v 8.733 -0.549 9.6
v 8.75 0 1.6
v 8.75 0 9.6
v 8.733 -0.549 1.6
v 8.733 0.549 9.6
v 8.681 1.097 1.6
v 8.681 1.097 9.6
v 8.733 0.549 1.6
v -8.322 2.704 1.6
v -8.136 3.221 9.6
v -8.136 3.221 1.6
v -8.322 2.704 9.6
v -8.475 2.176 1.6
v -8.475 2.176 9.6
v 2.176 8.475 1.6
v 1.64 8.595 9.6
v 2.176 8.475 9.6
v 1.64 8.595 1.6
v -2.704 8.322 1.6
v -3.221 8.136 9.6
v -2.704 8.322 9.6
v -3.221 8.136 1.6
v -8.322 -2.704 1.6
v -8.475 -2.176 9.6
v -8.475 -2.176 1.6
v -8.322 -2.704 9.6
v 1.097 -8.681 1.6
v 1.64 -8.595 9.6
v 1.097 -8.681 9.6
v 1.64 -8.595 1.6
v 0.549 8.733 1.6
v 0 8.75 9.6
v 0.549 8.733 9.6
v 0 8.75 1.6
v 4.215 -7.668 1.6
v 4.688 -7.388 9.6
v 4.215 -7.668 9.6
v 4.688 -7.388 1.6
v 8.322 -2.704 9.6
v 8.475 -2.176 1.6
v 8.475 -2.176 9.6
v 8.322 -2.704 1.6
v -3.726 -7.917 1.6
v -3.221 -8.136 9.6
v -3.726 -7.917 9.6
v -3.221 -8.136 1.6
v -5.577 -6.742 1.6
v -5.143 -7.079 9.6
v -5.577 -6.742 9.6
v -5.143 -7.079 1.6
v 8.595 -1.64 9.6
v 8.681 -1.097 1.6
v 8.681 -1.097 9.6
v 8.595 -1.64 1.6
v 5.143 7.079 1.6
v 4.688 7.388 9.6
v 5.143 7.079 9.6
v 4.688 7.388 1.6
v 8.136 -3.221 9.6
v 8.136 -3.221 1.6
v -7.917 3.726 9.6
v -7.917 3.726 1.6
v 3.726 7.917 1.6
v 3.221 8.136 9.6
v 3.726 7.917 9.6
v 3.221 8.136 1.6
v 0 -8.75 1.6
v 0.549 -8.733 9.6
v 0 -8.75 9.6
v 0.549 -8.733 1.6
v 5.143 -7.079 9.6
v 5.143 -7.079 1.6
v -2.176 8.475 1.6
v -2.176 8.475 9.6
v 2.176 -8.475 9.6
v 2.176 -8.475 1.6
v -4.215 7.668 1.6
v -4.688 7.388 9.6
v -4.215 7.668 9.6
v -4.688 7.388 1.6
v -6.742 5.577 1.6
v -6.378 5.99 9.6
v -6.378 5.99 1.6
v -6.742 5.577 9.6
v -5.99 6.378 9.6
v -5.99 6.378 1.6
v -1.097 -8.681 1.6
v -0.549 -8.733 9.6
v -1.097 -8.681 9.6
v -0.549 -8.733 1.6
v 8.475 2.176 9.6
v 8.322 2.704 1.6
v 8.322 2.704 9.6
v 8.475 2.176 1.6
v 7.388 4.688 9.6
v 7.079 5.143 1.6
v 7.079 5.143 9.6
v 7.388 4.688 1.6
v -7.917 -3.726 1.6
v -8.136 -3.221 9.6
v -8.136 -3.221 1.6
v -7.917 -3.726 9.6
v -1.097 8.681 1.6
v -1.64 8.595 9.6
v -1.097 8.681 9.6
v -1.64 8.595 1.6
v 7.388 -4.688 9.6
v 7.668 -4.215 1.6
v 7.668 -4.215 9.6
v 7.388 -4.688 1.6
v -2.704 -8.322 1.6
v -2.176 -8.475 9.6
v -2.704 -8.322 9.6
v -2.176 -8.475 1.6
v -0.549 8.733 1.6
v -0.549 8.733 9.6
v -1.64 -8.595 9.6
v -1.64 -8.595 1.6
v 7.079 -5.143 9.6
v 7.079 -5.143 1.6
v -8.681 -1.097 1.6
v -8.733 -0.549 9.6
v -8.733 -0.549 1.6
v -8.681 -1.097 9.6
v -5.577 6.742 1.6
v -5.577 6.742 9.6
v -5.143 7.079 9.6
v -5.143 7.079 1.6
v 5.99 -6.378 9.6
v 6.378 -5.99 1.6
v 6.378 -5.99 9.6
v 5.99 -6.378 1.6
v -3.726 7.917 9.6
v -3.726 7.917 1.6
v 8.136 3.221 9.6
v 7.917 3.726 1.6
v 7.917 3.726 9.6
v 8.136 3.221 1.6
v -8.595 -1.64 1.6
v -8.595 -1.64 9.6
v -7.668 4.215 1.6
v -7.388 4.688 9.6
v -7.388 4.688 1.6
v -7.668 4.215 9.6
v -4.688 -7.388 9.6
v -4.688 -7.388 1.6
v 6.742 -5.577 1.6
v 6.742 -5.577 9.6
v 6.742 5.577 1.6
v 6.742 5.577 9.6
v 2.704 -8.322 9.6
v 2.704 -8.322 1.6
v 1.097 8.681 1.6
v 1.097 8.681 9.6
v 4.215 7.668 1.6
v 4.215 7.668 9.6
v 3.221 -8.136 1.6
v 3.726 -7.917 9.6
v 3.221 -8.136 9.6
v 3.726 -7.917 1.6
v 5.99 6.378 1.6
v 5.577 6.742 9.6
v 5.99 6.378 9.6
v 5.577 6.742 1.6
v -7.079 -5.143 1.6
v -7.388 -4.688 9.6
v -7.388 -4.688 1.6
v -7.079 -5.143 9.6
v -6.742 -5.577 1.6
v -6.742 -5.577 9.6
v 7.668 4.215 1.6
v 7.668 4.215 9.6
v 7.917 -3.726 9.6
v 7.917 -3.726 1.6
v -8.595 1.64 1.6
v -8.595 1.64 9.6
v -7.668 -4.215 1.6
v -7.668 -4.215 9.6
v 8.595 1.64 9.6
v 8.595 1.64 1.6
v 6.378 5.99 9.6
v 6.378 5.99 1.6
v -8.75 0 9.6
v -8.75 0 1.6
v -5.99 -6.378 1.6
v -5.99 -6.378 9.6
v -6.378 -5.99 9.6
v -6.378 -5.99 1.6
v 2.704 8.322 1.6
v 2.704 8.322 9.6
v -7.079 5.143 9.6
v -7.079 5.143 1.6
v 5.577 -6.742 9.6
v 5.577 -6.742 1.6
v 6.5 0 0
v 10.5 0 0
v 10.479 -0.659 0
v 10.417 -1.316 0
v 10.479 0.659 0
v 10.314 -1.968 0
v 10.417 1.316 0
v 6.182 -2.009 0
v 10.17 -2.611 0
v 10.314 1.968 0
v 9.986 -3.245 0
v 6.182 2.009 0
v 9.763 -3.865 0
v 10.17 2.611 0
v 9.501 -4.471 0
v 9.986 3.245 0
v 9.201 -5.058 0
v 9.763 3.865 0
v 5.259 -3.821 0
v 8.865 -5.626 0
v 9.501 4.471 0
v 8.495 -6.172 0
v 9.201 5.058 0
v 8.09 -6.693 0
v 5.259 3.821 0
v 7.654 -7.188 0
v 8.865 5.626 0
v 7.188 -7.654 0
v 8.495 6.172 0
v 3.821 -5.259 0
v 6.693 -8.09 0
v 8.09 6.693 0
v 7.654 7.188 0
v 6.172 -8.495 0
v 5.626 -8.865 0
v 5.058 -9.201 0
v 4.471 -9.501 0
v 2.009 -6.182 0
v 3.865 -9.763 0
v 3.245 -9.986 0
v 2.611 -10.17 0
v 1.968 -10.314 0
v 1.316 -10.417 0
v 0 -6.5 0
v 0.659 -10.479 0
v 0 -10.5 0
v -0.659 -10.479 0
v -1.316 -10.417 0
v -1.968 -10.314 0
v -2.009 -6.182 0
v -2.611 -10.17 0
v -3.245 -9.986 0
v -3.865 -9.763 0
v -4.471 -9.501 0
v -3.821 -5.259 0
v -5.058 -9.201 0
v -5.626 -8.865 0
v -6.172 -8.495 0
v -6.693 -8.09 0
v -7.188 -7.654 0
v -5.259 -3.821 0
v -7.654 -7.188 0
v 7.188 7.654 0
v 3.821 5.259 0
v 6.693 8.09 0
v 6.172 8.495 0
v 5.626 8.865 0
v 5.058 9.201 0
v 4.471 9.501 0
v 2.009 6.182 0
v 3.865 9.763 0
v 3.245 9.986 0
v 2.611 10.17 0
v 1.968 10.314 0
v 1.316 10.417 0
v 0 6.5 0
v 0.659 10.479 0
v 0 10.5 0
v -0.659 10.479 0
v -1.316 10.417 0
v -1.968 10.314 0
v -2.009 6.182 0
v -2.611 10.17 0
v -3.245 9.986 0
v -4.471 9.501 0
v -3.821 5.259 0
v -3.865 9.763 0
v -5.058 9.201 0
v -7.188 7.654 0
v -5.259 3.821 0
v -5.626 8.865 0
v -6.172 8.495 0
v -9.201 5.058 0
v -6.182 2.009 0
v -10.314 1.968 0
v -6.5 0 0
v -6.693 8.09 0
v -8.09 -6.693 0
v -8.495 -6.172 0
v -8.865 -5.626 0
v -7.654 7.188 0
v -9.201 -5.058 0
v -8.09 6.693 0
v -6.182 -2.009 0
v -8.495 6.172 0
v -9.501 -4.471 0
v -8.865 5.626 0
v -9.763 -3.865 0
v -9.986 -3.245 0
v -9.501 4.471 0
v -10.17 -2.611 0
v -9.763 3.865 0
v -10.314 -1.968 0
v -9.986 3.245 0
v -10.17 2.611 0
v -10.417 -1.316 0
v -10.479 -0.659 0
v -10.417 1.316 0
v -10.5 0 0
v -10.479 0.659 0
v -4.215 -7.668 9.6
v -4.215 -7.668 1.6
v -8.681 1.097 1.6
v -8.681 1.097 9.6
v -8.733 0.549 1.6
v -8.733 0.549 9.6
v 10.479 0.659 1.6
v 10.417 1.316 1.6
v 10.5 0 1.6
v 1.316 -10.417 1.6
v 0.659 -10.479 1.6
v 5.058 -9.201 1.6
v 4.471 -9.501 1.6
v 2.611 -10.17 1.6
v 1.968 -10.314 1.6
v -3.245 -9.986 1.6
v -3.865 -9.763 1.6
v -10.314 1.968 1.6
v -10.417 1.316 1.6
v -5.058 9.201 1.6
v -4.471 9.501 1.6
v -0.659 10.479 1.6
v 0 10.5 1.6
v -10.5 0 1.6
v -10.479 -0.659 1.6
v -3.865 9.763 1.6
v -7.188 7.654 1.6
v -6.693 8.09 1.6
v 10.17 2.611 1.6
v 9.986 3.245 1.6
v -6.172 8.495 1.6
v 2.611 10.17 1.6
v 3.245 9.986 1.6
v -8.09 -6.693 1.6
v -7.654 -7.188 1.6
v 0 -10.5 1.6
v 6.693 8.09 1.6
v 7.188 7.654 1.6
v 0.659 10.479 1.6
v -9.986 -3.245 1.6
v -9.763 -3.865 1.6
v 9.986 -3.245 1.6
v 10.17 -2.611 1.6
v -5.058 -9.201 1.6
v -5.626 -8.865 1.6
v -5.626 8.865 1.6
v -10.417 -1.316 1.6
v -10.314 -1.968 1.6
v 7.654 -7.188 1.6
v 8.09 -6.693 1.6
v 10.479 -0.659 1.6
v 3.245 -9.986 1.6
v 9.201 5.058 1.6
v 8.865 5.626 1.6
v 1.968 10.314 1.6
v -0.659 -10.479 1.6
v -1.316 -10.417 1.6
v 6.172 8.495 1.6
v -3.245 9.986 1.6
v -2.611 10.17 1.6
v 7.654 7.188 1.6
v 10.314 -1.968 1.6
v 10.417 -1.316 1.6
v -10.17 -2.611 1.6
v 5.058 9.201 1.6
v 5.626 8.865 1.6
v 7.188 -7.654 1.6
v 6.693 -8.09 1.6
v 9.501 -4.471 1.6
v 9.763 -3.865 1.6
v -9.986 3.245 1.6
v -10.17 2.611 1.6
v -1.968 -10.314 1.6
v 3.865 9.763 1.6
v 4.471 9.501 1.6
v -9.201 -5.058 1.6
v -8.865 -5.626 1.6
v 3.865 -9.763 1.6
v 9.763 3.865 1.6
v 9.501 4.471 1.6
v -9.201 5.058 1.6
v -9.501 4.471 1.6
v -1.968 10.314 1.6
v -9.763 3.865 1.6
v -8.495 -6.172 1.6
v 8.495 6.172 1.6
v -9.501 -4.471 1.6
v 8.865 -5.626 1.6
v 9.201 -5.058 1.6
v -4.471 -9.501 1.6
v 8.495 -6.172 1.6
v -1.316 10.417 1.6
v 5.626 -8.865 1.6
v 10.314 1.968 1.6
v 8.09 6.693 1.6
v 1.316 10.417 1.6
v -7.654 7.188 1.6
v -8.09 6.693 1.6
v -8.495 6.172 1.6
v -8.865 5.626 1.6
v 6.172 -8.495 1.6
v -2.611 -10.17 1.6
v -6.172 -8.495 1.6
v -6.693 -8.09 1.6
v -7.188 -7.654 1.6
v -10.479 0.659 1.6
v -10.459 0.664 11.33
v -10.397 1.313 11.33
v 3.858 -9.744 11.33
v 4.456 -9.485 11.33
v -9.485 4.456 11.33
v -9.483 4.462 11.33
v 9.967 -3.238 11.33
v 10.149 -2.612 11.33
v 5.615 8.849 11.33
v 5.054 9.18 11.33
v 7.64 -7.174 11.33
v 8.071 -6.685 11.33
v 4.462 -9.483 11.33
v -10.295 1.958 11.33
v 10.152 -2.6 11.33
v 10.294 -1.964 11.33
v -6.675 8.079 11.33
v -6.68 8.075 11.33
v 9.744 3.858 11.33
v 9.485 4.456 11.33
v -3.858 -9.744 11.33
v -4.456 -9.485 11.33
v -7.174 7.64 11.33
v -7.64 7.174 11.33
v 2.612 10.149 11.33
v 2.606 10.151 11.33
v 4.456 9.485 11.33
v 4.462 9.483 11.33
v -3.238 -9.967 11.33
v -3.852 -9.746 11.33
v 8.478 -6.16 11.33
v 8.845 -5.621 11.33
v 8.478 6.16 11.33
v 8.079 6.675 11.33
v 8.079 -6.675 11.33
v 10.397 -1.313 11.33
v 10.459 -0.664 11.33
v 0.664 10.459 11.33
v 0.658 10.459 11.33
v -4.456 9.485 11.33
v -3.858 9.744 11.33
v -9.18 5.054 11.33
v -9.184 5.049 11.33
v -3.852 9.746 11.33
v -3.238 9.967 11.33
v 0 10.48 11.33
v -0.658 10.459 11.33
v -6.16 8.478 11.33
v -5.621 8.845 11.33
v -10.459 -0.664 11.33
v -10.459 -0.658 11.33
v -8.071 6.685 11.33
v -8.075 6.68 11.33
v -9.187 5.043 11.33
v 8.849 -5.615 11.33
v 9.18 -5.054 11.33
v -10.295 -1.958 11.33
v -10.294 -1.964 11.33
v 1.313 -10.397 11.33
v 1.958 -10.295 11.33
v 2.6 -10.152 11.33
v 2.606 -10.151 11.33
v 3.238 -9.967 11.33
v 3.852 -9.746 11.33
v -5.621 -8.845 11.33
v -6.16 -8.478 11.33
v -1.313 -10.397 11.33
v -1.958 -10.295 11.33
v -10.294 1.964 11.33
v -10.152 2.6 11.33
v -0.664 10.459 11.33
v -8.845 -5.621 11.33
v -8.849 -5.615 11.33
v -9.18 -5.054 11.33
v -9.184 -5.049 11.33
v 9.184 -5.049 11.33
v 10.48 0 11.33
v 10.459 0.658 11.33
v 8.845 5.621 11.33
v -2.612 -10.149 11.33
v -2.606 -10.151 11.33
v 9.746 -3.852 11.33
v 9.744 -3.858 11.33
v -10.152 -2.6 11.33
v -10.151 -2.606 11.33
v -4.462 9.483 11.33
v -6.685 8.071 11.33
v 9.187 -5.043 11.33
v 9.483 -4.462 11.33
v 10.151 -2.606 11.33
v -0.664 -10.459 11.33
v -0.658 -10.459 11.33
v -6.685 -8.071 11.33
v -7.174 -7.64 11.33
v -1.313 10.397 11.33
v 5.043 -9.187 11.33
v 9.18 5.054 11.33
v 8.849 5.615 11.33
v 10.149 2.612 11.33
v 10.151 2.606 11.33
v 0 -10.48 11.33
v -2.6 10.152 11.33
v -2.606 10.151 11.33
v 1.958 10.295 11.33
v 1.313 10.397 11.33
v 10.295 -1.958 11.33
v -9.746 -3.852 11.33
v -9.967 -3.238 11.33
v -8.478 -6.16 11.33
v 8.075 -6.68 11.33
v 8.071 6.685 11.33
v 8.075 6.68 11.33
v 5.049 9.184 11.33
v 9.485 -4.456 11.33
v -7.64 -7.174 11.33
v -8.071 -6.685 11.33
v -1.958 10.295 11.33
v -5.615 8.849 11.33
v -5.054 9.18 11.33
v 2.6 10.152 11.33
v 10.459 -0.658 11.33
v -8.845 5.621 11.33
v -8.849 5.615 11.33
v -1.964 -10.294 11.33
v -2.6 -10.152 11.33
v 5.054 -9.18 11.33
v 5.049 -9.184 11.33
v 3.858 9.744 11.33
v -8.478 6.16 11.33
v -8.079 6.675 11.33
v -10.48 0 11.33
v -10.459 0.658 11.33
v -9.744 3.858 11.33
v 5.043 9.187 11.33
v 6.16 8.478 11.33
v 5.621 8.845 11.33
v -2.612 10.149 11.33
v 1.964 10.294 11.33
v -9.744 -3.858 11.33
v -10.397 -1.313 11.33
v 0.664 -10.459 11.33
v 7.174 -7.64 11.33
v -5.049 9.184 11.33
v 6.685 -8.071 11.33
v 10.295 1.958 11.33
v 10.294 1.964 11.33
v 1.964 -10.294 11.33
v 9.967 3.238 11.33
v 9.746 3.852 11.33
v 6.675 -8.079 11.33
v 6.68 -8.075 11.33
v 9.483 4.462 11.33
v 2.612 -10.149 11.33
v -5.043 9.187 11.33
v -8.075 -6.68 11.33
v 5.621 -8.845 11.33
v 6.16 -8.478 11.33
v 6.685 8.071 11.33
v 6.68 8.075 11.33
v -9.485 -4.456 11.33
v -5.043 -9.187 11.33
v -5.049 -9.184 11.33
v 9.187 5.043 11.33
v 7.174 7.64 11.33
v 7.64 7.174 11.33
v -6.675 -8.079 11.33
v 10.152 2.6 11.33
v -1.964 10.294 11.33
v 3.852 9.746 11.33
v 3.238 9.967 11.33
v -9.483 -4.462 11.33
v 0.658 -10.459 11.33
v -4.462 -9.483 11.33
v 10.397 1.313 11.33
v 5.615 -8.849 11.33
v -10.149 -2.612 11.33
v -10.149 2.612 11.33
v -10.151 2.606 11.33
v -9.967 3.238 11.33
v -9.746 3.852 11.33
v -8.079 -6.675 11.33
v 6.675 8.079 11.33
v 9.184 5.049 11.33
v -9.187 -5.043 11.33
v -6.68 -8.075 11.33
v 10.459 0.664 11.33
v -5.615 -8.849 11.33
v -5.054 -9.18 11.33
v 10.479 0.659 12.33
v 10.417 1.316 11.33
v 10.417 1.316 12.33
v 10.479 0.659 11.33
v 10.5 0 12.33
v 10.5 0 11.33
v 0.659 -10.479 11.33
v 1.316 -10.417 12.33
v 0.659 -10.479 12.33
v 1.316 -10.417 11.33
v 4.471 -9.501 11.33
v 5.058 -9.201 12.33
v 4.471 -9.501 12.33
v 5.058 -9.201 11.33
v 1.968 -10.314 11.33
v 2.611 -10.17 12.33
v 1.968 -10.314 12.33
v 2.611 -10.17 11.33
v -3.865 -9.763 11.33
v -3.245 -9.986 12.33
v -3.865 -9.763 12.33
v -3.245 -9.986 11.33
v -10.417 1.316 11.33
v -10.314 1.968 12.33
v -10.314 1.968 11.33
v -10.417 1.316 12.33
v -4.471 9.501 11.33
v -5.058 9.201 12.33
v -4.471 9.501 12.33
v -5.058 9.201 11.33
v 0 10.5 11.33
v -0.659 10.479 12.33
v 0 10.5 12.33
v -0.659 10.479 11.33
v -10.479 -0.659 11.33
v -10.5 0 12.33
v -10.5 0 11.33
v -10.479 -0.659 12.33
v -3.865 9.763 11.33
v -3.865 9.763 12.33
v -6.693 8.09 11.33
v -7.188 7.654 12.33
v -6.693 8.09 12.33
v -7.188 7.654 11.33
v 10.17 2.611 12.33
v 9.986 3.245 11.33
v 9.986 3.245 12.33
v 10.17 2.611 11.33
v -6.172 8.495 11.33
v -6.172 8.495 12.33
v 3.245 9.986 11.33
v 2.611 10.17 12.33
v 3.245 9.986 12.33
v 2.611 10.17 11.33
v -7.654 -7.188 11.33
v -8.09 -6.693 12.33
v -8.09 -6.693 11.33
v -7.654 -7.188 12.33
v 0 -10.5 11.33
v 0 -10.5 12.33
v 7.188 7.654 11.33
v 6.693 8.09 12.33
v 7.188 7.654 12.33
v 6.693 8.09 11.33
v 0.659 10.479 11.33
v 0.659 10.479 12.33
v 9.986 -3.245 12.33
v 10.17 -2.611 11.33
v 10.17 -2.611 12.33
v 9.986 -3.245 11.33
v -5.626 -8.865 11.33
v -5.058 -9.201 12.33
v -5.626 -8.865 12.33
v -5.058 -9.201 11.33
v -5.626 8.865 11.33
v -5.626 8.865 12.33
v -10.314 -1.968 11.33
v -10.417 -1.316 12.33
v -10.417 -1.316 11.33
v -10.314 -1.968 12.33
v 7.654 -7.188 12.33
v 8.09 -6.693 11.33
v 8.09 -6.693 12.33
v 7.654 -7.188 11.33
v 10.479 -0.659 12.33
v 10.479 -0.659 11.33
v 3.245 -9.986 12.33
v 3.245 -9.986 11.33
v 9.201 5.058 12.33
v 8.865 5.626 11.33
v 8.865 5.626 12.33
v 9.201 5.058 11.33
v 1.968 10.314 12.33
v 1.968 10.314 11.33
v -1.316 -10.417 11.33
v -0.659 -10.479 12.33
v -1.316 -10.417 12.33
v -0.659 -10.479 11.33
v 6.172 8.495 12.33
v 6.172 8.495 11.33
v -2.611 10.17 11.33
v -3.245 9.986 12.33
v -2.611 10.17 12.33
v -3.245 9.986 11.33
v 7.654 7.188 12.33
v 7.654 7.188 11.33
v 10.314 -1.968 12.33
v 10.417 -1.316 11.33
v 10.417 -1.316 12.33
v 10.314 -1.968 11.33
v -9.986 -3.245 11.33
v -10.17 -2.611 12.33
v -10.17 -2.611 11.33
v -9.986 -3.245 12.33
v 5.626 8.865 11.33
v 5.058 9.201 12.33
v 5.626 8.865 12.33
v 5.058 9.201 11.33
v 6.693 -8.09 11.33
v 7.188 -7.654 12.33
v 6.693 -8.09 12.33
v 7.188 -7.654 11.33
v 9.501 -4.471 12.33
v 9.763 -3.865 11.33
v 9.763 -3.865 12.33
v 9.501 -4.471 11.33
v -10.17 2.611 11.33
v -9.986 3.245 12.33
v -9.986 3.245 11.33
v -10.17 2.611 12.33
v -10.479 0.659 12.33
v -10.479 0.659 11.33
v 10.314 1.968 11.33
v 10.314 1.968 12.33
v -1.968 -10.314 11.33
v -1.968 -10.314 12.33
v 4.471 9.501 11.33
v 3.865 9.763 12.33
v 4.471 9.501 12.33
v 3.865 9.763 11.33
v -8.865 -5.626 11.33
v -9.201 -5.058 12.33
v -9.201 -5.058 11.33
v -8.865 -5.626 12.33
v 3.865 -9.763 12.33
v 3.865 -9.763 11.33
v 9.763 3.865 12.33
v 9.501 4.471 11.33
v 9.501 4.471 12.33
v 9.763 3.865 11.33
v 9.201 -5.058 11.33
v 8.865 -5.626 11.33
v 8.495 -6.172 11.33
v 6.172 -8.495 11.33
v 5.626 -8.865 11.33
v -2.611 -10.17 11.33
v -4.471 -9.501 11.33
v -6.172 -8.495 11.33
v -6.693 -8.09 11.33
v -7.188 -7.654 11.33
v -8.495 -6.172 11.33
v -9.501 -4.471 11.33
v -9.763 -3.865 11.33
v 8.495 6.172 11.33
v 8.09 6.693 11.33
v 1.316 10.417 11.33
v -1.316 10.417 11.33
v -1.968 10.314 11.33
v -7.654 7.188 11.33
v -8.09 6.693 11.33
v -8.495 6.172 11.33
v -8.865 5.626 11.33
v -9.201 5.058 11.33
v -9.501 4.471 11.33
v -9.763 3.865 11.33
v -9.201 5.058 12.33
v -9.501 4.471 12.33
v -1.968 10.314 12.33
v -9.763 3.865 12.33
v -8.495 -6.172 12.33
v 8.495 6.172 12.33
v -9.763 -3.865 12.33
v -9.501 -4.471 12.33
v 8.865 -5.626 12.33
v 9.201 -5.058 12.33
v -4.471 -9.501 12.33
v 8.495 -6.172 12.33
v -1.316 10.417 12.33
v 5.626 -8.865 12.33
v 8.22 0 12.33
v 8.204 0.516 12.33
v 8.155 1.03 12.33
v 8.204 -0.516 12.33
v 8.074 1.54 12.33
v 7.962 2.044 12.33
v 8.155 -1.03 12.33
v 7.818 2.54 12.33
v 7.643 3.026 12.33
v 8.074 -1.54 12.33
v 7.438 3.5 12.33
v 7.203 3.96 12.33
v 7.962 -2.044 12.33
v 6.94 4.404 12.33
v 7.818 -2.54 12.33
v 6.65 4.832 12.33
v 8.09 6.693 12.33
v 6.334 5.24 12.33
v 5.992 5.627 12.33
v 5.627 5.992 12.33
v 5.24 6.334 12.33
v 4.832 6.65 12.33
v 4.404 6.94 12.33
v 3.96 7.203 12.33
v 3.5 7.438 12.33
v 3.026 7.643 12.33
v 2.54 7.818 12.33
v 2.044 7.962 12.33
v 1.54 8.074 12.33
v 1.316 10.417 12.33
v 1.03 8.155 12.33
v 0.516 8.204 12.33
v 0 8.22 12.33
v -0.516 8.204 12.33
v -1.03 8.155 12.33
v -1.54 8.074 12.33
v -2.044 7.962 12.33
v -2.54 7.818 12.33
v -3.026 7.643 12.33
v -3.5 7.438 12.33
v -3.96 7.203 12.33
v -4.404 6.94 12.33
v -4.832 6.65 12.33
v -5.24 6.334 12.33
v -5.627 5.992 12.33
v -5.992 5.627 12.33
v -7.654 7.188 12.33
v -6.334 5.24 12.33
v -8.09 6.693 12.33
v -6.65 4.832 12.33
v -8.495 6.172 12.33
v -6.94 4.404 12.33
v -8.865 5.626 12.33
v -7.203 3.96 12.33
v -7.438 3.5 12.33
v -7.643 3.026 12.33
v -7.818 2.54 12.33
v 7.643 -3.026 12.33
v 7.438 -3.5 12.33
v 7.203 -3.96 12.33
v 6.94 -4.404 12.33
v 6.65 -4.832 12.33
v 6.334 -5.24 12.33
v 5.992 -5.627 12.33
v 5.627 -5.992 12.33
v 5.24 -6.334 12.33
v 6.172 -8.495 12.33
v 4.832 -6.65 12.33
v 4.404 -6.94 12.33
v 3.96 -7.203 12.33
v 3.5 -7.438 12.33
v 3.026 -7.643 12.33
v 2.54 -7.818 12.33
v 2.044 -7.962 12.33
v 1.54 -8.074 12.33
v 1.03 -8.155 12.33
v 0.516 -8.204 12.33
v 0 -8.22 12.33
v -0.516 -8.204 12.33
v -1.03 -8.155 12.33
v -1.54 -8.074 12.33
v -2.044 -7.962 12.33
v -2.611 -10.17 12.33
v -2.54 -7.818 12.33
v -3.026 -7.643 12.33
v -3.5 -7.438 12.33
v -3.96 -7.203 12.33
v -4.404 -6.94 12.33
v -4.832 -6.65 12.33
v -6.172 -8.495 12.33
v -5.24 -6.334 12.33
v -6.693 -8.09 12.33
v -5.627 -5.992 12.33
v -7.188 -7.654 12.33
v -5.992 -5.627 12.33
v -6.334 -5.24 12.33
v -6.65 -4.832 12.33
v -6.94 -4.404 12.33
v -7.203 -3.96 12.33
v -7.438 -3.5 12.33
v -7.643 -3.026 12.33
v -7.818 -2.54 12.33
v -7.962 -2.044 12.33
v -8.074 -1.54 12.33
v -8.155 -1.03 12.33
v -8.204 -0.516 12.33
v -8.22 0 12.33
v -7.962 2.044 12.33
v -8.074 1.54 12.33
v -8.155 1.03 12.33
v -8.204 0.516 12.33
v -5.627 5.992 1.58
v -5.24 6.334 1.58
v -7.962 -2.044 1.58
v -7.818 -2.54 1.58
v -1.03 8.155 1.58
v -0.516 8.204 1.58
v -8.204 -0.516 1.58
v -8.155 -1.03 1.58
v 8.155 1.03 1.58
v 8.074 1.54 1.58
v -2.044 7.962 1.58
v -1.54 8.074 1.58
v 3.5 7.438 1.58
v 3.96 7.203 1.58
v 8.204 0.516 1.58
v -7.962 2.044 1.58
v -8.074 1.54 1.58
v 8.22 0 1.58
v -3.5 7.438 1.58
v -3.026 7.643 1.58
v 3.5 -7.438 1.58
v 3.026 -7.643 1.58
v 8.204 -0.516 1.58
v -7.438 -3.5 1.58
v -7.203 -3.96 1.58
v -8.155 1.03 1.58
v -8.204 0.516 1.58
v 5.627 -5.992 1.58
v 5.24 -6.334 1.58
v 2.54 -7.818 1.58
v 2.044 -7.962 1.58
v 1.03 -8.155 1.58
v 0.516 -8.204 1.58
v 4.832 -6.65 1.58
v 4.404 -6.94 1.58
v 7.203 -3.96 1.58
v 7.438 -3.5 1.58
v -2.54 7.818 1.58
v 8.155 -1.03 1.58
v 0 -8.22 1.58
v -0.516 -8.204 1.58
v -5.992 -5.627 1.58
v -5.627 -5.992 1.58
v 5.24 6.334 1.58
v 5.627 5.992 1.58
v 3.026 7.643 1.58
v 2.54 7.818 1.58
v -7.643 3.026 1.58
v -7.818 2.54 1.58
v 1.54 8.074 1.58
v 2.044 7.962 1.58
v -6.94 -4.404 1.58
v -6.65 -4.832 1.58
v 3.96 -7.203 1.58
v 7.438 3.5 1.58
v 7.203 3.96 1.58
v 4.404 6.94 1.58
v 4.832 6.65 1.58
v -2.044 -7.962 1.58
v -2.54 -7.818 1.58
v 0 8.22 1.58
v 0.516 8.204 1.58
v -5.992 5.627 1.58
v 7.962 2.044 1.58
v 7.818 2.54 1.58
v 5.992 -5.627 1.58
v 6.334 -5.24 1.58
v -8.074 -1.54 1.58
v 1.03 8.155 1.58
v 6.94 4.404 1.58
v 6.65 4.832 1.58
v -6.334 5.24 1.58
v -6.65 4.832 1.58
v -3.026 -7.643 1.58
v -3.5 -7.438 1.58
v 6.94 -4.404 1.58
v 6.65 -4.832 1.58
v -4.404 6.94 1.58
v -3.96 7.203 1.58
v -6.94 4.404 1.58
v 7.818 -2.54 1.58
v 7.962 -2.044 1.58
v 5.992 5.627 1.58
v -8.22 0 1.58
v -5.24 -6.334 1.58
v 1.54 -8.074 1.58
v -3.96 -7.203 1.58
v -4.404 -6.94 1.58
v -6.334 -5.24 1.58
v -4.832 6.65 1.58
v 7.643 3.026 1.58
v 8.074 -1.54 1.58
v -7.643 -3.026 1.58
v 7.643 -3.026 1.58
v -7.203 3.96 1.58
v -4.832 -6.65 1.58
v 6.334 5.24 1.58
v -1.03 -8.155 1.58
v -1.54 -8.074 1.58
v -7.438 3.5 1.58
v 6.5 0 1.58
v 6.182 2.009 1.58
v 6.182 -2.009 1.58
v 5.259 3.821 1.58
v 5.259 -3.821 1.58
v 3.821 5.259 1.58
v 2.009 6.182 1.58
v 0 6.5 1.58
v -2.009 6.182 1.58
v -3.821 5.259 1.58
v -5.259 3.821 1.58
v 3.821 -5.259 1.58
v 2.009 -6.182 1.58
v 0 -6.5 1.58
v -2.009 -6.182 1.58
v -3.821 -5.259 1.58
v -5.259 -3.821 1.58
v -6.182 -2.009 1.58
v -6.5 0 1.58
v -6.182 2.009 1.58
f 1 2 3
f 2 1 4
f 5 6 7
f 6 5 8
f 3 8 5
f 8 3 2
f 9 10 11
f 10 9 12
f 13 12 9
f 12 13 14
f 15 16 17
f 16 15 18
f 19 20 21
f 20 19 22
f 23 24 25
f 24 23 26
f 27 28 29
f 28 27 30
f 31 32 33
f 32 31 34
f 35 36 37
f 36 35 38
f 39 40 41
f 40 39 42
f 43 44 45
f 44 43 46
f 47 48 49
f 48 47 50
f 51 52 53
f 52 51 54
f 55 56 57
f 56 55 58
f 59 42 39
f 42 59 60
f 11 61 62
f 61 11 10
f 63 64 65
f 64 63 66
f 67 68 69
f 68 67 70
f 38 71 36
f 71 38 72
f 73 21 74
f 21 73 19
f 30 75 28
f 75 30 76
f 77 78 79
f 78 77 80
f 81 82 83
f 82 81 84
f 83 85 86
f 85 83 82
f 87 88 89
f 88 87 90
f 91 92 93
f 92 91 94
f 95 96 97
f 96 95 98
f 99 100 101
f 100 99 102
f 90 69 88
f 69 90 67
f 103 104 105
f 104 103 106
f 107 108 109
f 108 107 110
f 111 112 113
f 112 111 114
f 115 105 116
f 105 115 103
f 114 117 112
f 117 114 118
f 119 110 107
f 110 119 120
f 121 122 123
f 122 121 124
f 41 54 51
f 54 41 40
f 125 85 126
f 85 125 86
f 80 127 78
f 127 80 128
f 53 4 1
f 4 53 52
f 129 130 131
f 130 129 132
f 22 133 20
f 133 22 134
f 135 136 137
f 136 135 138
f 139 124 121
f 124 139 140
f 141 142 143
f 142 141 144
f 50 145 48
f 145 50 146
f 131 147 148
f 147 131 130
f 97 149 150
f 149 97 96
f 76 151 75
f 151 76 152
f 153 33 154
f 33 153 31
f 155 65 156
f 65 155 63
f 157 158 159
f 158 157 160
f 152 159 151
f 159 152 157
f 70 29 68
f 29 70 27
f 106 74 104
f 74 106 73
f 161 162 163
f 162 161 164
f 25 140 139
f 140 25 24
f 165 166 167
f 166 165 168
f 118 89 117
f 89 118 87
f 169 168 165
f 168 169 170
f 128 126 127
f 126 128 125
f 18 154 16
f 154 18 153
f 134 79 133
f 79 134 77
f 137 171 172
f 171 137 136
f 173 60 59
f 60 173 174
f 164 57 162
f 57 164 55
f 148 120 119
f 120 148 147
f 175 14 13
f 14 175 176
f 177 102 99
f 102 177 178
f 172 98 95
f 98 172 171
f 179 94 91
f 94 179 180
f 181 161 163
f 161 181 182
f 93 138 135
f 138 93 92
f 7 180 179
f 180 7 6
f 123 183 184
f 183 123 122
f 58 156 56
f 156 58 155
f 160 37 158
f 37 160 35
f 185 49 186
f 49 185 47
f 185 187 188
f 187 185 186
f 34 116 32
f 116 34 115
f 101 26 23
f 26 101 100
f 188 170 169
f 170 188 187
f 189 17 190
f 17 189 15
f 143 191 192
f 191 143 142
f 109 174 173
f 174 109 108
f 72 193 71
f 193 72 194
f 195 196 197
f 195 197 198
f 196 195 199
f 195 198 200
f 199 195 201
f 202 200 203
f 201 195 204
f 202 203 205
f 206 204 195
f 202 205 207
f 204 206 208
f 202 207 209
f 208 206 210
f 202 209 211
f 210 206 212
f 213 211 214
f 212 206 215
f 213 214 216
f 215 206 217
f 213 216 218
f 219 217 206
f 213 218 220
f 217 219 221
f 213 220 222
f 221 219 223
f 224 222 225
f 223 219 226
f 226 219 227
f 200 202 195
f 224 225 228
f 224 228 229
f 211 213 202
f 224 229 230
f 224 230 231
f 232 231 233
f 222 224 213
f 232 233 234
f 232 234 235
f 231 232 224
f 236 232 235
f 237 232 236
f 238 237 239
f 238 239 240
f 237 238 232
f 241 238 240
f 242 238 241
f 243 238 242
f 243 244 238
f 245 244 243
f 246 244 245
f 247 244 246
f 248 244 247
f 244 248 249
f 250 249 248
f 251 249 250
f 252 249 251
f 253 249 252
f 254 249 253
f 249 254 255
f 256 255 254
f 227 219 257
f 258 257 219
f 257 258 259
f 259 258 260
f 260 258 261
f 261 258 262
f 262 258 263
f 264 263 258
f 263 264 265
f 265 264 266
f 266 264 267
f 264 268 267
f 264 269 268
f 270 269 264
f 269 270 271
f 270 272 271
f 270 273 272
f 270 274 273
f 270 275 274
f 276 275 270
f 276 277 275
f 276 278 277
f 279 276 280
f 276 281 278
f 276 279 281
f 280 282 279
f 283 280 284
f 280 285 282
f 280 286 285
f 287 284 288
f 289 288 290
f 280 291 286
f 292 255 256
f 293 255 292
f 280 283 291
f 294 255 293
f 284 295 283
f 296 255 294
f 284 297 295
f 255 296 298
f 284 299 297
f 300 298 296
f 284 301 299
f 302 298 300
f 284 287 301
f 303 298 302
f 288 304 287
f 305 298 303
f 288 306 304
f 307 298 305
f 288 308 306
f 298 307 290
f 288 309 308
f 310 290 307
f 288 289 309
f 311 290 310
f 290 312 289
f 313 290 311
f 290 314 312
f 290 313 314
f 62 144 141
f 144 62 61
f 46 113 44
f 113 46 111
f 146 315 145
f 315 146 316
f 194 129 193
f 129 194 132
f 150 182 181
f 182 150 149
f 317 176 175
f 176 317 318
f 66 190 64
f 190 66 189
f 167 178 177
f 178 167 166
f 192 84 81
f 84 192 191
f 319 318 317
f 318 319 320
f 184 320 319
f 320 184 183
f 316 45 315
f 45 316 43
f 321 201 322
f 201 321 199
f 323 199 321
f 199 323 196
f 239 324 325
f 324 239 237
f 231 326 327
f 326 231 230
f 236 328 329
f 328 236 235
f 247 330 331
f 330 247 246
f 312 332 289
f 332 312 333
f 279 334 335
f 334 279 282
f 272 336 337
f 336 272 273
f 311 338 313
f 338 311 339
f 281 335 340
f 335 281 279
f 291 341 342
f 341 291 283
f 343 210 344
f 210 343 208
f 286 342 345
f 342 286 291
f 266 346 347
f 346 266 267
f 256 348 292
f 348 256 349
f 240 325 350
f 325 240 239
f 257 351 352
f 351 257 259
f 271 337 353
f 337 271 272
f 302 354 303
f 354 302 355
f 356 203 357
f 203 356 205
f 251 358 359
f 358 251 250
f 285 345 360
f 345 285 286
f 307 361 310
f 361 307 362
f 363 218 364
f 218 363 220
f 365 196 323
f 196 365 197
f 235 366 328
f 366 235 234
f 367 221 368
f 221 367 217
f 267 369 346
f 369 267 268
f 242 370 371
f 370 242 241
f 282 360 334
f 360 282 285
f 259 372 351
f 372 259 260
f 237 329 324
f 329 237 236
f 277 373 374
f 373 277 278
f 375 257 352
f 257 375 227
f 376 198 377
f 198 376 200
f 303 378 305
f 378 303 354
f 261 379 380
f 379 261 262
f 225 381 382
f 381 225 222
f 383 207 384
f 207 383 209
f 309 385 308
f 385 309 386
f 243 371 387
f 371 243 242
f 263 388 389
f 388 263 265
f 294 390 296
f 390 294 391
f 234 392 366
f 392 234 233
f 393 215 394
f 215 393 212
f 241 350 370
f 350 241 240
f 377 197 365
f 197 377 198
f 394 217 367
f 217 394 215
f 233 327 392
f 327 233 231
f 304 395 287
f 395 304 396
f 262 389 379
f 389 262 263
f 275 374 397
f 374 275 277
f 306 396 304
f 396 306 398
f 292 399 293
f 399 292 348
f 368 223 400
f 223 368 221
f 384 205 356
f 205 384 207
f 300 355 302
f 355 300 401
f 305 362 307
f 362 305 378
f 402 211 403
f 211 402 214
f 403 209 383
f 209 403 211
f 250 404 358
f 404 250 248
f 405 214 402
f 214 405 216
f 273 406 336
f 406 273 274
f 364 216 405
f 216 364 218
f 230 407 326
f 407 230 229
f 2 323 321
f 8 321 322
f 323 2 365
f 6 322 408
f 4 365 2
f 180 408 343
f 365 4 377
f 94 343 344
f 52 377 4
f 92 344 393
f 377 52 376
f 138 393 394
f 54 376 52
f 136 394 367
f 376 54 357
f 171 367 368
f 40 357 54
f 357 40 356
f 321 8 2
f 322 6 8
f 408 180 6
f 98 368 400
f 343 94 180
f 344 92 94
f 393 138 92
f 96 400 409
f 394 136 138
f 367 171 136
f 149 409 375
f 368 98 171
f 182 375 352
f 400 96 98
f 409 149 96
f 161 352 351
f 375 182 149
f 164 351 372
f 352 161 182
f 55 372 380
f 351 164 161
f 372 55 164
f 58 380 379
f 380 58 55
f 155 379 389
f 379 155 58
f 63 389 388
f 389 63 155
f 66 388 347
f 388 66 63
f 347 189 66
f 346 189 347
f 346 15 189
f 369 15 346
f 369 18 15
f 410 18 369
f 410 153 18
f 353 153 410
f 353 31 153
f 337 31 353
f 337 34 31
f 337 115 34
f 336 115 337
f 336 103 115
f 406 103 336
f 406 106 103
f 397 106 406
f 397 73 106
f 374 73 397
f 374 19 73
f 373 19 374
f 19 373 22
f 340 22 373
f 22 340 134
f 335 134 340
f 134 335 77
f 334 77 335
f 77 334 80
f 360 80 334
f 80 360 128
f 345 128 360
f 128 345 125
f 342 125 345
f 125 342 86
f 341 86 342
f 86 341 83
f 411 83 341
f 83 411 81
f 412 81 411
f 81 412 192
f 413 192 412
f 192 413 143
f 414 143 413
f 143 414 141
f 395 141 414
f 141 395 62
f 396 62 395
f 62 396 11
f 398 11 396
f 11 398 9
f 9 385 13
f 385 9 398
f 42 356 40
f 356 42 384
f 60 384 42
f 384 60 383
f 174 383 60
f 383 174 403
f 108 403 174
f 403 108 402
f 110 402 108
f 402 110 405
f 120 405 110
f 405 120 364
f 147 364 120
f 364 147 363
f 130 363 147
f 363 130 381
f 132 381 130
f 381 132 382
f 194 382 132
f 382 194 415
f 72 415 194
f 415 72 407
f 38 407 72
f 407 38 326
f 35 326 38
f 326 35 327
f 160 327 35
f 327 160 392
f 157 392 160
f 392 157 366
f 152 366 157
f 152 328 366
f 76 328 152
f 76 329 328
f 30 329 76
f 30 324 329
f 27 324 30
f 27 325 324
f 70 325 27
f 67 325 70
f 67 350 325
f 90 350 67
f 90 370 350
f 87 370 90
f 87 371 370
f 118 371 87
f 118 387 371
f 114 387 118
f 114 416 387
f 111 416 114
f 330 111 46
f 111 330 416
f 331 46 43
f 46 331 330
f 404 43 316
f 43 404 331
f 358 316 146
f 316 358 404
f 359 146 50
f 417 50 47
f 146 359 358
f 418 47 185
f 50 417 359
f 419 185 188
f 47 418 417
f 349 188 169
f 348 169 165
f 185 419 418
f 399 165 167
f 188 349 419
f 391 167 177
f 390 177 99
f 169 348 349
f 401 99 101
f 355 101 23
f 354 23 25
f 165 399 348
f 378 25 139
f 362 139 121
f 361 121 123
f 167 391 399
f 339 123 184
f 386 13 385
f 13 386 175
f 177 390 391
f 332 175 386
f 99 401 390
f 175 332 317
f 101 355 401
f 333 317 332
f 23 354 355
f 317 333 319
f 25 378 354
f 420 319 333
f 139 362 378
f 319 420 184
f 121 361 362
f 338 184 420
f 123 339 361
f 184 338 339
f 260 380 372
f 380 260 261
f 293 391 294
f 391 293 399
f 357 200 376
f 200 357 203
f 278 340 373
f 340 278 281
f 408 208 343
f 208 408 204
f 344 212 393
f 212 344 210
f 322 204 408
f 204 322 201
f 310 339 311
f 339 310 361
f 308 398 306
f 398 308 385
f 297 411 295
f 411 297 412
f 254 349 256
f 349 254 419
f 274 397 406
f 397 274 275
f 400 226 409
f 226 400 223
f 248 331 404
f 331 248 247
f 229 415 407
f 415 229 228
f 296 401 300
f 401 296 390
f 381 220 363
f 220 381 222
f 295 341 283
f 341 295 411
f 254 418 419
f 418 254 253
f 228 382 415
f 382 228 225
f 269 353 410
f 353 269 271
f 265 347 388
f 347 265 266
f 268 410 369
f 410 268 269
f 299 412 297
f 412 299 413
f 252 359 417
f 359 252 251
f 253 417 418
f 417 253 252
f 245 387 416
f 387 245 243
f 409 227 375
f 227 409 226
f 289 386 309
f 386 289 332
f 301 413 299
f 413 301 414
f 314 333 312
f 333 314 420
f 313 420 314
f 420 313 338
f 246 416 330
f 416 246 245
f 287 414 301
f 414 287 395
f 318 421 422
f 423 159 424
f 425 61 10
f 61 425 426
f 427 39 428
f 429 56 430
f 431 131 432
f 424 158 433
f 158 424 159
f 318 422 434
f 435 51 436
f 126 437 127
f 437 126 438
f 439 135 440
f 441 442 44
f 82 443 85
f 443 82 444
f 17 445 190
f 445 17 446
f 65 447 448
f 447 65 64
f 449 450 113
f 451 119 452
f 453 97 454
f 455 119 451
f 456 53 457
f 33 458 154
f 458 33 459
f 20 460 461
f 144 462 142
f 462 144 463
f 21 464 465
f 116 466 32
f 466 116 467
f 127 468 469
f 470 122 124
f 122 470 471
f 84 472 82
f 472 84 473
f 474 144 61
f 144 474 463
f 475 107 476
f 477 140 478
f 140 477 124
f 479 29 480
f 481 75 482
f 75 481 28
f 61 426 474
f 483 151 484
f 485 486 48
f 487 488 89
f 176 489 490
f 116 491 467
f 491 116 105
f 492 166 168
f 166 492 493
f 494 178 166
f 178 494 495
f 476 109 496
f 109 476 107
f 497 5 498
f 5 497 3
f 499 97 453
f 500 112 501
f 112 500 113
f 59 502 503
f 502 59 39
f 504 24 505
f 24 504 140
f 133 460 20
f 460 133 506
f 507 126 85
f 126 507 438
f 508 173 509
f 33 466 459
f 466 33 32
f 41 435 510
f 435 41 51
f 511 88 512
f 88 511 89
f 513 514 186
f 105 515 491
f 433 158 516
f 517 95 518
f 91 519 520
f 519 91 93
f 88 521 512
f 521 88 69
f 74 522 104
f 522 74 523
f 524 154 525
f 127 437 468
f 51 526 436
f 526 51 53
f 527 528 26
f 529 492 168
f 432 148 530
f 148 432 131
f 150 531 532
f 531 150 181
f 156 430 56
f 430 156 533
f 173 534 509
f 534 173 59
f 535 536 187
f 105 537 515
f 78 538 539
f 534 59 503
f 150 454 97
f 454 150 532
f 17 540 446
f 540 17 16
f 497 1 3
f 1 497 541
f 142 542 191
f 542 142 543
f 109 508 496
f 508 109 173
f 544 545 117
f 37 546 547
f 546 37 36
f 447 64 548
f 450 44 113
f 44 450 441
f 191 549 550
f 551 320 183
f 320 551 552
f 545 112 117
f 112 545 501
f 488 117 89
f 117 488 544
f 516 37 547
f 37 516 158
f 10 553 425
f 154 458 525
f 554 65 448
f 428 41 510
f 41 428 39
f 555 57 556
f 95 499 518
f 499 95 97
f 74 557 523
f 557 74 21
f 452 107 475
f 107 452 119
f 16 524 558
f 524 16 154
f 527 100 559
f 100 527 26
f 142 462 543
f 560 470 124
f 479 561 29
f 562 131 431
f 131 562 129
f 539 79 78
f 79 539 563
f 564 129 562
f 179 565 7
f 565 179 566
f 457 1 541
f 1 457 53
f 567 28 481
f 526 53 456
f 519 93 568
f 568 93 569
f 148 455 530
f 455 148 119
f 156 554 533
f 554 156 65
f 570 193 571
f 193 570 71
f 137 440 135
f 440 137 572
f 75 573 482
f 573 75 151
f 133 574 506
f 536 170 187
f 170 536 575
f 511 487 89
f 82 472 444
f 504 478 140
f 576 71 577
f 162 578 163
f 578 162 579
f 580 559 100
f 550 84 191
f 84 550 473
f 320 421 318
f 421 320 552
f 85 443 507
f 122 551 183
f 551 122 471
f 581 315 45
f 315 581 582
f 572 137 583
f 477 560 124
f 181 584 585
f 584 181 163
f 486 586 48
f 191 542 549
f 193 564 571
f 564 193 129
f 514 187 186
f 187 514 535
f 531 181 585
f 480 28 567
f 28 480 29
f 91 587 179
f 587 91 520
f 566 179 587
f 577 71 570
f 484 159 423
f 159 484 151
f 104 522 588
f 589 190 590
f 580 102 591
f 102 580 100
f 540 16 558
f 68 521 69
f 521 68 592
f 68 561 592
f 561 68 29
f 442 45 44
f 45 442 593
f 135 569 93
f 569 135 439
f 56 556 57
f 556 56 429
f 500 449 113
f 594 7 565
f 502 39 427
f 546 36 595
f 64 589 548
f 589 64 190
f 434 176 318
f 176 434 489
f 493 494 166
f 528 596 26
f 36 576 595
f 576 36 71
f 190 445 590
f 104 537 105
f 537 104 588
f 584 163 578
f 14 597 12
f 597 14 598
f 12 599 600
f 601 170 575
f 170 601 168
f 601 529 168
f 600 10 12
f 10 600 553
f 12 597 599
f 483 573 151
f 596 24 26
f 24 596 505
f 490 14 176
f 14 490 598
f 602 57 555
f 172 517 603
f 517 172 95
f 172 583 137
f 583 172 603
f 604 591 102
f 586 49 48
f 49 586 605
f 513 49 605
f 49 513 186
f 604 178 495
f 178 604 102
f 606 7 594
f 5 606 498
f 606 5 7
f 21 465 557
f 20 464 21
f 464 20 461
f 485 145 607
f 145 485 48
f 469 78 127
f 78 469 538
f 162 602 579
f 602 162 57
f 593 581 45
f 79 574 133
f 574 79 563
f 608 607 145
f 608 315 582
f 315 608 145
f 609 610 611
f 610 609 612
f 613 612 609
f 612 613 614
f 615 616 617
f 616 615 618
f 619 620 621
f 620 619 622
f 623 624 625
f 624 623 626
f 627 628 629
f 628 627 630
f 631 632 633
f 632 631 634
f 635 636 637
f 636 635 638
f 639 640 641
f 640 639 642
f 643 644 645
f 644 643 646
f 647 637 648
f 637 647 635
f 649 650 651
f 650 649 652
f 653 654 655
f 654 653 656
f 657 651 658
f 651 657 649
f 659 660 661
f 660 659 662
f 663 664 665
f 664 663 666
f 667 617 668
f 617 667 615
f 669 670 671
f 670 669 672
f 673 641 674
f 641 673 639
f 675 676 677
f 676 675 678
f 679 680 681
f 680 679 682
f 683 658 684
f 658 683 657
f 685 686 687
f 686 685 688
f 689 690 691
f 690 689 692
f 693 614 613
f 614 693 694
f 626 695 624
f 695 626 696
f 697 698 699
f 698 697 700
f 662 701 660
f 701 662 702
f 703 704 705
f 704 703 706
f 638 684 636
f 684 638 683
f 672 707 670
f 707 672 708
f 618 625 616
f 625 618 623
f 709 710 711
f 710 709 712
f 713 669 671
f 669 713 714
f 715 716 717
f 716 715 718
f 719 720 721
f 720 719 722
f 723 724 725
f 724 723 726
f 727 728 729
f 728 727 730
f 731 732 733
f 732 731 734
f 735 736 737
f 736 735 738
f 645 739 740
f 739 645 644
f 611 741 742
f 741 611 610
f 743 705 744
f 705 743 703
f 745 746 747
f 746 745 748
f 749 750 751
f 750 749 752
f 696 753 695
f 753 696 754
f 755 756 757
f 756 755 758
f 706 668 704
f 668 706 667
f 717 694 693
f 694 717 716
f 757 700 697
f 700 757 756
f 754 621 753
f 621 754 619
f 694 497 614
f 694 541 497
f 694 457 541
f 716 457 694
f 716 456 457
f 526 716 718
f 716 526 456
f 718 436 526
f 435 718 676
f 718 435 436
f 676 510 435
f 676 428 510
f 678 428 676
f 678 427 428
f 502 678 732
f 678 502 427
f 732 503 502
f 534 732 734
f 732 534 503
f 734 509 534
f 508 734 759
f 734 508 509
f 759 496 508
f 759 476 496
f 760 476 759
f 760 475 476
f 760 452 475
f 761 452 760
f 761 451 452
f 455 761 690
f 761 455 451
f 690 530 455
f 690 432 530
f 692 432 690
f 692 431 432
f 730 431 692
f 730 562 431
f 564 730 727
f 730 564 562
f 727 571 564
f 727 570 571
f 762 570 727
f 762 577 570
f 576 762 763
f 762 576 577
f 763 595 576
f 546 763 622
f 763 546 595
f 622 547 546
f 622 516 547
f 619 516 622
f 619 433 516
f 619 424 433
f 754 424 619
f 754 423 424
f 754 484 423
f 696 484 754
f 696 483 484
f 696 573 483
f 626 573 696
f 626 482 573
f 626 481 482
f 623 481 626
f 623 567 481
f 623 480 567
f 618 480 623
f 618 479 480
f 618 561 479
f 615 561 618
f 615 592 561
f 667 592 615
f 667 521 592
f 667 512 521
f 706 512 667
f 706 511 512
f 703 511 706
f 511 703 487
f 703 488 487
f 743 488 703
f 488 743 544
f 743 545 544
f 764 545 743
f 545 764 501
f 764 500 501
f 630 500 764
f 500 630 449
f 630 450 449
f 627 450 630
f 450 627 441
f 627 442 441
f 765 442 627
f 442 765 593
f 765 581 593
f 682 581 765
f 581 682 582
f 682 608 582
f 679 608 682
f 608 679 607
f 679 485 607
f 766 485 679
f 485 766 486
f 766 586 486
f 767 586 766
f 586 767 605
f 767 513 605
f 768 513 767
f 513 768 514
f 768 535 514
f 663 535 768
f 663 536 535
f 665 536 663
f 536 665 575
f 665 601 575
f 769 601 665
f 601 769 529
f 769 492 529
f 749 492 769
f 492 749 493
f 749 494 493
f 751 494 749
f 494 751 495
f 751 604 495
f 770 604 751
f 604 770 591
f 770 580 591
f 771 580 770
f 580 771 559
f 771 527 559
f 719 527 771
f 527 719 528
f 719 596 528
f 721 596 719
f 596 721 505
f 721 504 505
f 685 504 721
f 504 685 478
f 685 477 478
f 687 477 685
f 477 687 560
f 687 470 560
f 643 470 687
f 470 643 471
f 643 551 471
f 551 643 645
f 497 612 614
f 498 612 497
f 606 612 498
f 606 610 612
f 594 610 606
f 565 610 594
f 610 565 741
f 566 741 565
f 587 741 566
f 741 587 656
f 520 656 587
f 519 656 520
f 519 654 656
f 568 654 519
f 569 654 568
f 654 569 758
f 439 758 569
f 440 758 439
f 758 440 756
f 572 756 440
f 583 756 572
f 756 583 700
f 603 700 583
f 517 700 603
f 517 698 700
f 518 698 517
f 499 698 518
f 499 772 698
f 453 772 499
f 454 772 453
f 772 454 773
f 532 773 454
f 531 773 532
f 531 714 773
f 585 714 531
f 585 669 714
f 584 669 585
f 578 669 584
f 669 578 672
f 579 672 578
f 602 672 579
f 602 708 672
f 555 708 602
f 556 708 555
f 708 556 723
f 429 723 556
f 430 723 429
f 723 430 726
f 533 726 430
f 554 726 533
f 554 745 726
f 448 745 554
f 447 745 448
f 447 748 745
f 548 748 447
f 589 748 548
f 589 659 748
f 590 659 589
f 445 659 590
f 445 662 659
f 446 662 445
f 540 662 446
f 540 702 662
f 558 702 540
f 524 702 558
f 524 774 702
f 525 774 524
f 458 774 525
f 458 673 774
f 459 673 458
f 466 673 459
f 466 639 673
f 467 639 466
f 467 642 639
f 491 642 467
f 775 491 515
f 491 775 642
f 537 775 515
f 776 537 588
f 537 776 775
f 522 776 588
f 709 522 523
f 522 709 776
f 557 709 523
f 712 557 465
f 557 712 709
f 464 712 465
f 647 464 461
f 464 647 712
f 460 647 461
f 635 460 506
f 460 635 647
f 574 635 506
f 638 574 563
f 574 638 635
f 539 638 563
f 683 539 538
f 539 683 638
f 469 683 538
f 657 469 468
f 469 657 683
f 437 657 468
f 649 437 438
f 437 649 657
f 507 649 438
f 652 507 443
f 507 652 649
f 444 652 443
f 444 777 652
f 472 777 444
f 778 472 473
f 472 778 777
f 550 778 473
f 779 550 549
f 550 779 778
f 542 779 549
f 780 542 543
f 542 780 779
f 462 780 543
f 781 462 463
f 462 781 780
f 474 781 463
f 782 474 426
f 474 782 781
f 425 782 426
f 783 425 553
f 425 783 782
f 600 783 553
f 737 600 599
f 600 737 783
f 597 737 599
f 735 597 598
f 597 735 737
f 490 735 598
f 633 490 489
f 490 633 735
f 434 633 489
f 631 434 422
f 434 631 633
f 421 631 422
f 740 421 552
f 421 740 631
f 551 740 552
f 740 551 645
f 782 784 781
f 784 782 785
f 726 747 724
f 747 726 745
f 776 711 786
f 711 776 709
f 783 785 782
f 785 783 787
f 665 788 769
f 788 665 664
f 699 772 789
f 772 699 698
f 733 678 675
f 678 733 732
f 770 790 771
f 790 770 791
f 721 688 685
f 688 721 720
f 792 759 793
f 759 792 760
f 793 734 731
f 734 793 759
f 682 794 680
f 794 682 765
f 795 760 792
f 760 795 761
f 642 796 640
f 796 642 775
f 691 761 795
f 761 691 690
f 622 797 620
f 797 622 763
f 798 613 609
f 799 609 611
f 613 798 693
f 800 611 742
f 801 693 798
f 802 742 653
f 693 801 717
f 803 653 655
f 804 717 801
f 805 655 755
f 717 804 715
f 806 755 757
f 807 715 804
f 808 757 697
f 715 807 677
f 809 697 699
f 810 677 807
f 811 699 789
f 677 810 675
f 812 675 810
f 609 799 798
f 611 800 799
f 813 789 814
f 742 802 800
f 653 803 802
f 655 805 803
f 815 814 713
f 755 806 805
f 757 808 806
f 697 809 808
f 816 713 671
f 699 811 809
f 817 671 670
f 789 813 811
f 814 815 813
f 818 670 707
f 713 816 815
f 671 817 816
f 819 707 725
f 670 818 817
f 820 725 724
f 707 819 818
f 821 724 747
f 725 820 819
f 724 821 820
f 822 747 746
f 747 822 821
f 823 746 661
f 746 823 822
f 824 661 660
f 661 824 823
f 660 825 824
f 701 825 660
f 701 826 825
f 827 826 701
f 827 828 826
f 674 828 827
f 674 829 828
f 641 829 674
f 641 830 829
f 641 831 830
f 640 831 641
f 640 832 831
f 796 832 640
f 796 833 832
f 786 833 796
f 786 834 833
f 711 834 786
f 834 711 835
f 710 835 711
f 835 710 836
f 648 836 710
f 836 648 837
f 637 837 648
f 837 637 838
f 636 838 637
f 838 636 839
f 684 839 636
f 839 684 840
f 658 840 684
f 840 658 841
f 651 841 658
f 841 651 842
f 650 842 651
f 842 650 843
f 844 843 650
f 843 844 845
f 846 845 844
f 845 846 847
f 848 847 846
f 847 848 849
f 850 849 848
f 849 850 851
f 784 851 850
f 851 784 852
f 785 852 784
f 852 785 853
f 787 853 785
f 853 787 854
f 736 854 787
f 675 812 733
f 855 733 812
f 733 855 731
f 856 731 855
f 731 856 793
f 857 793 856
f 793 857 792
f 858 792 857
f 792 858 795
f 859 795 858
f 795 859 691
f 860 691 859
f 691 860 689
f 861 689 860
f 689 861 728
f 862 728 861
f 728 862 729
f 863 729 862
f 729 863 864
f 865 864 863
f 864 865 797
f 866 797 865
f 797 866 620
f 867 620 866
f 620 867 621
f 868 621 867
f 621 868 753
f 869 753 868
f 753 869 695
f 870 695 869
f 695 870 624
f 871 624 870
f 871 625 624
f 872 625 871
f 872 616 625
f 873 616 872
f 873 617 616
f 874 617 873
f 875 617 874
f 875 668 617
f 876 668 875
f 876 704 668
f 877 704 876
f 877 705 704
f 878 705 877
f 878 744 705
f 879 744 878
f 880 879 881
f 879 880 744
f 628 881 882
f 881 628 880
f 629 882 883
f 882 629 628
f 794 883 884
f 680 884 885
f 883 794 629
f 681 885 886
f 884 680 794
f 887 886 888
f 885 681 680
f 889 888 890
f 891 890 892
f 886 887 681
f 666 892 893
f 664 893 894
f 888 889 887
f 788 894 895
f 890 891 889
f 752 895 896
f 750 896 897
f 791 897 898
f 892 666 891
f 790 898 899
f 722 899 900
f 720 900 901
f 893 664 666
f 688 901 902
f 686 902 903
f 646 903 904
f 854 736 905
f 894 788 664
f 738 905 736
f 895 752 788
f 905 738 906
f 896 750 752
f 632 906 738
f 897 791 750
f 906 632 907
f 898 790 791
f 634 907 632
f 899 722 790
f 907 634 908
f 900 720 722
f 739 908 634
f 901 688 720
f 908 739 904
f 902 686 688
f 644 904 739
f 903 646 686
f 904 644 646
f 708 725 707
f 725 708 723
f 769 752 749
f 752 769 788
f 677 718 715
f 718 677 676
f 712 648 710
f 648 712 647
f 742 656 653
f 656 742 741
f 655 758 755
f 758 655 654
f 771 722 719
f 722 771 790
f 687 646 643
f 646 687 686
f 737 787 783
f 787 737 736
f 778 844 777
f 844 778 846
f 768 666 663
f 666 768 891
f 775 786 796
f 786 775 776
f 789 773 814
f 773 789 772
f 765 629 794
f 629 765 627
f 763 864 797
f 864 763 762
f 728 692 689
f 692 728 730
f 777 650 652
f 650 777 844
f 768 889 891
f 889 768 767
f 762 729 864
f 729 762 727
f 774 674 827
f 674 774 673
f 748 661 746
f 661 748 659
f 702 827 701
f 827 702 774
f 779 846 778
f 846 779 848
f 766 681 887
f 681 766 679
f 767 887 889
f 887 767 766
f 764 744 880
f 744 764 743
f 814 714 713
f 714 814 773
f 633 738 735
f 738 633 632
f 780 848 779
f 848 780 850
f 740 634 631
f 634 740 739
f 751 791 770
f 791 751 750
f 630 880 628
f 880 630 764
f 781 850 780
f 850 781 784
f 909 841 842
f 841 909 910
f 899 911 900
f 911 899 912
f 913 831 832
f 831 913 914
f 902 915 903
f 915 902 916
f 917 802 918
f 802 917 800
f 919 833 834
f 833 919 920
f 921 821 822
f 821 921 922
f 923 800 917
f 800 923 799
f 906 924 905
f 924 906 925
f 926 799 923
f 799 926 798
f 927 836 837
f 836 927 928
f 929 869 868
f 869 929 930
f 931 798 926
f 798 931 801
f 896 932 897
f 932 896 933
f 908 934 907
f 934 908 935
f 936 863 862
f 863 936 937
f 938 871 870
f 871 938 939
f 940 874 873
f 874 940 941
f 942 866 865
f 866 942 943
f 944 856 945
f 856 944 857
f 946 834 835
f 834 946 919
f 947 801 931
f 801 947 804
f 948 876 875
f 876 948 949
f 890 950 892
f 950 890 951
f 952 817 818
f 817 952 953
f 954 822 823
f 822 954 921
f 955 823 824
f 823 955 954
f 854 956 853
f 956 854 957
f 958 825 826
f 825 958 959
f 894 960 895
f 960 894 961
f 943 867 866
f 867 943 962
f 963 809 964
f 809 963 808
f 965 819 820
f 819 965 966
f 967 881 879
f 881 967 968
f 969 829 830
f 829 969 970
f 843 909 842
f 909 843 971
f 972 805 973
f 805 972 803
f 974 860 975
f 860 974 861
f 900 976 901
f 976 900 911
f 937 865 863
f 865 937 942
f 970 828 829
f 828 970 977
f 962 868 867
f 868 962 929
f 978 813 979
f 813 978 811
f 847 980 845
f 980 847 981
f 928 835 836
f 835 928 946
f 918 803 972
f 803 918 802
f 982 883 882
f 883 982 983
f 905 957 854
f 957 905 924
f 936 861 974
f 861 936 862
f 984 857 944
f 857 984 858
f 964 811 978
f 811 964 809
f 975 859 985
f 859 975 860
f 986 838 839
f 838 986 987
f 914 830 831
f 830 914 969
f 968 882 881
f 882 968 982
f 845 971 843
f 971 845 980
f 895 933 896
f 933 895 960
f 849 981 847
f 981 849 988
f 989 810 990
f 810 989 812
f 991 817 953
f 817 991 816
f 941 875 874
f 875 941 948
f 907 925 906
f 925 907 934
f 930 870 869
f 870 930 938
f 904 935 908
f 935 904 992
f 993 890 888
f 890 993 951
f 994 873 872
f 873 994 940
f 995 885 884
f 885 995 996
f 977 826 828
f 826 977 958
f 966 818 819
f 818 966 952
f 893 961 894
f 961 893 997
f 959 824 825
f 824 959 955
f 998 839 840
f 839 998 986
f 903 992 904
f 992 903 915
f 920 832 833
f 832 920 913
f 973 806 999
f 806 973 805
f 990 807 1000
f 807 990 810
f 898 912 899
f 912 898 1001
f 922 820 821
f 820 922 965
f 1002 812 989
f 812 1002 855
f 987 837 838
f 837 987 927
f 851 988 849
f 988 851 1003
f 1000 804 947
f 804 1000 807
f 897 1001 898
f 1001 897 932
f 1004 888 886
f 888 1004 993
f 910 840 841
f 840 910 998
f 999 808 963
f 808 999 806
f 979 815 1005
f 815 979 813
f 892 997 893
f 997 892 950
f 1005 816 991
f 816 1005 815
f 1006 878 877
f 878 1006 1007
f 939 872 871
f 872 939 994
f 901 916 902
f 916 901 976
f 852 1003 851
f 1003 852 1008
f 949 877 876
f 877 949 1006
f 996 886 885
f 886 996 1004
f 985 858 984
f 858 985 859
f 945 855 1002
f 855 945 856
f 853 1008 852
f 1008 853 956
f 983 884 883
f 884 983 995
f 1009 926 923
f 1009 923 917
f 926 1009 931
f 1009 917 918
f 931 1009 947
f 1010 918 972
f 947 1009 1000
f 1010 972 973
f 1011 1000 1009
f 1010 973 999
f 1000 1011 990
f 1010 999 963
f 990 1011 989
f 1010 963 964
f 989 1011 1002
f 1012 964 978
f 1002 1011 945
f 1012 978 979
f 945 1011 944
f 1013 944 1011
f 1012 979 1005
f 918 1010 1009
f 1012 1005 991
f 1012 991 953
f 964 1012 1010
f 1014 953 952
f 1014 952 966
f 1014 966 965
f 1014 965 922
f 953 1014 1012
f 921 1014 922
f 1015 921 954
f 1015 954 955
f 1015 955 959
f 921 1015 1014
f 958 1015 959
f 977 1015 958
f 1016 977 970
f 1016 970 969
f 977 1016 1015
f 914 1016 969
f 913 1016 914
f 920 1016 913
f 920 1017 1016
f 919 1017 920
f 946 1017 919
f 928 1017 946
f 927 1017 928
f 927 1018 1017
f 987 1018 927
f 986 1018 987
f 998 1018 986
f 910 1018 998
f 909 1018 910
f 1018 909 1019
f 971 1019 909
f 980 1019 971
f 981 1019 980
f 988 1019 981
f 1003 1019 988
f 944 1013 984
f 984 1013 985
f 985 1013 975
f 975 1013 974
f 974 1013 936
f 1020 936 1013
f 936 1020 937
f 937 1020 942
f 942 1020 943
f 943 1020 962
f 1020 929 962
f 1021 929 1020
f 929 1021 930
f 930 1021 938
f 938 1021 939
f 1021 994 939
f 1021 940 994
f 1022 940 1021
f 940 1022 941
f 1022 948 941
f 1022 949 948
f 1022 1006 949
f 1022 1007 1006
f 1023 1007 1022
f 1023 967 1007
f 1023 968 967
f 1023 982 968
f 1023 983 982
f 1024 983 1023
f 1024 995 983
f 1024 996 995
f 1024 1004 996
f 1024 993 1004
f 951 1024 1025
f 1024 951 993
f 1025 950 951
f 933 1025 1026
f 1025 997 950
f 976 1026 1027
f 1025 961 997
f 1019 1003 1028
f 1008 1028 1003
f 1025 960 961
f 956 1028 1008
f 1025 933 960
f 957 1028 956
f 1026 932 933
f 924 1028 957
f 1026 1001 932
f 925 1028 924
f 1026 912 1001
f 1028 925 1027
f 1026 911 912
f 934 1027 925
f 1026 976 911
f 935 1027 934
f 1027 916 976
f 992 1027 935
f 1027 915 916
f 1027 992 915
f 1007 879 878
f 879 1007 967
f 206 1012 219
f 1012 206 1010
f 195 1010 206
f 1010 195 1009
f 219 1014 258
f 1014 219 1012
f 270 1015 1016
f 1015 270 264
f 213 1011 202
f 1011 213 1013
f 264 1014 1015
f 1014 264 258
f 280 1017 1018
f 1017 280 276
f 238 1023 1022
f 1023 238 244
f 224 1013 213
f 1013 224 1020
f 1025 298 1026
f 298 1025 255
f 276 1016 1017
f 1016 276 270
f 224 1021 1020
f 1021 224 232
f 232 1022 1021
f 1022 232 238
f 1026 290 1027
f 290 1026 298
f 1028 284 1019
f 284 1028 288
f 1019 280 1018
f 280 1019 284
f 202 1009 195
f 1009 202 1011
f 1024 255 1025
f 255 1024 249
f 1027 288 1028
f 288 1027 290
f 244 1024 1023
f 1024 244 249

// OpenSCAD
// Idler designed for use with a Shapeoko and 625Z bearings.
// Loosely designed around existing idler's dimensions, drawing at
// http://www.buildlog.net/documents/b30041_rev_1.pdf
// but adapted experimentally to be printable and snug.

idler_width = 11.2;
bearing_od = 16;
bearing_clearance = 0.22;
// Wall needs to be wide enough that your slider gives it two perimeters, so
// ~double your nozzle.  0.75 works for an 0.4 nozzle in skeinforge.
wall = 0.75;
e = 0.02;

$fn=100;
difference() {
  union() {
    // main body
    cylinder(r=bearing_od/2+wall, h=idler_width);
    // base flange
    cylinder(r=bearing_od/2+2.5, h=1.6);
    // top flange, spool-shaped to be printable with 45-degree overhang
    translate([0,0,9.6])
      cylinder(r1=bearing_od/2+wall, r2=bearing_od/2+2.5, h=2.5-wall);
    translate([0,0,9.6+2.5-wall-e])
      cylinder(r=bearing_od/2+2.5, h=1);
  }
  // cutouts
  union() {
    // bearing size
    translate([0,0,1.6-e])
      cylinder(r=bearing_od/2+bearing_clearance, h=idler_width+2);
    // leave bottom flange inside
    translate([0,0,-1])
      cylinder(r=bearing_od/2-1.5, h=3.6, $fn=20);
  }
}
